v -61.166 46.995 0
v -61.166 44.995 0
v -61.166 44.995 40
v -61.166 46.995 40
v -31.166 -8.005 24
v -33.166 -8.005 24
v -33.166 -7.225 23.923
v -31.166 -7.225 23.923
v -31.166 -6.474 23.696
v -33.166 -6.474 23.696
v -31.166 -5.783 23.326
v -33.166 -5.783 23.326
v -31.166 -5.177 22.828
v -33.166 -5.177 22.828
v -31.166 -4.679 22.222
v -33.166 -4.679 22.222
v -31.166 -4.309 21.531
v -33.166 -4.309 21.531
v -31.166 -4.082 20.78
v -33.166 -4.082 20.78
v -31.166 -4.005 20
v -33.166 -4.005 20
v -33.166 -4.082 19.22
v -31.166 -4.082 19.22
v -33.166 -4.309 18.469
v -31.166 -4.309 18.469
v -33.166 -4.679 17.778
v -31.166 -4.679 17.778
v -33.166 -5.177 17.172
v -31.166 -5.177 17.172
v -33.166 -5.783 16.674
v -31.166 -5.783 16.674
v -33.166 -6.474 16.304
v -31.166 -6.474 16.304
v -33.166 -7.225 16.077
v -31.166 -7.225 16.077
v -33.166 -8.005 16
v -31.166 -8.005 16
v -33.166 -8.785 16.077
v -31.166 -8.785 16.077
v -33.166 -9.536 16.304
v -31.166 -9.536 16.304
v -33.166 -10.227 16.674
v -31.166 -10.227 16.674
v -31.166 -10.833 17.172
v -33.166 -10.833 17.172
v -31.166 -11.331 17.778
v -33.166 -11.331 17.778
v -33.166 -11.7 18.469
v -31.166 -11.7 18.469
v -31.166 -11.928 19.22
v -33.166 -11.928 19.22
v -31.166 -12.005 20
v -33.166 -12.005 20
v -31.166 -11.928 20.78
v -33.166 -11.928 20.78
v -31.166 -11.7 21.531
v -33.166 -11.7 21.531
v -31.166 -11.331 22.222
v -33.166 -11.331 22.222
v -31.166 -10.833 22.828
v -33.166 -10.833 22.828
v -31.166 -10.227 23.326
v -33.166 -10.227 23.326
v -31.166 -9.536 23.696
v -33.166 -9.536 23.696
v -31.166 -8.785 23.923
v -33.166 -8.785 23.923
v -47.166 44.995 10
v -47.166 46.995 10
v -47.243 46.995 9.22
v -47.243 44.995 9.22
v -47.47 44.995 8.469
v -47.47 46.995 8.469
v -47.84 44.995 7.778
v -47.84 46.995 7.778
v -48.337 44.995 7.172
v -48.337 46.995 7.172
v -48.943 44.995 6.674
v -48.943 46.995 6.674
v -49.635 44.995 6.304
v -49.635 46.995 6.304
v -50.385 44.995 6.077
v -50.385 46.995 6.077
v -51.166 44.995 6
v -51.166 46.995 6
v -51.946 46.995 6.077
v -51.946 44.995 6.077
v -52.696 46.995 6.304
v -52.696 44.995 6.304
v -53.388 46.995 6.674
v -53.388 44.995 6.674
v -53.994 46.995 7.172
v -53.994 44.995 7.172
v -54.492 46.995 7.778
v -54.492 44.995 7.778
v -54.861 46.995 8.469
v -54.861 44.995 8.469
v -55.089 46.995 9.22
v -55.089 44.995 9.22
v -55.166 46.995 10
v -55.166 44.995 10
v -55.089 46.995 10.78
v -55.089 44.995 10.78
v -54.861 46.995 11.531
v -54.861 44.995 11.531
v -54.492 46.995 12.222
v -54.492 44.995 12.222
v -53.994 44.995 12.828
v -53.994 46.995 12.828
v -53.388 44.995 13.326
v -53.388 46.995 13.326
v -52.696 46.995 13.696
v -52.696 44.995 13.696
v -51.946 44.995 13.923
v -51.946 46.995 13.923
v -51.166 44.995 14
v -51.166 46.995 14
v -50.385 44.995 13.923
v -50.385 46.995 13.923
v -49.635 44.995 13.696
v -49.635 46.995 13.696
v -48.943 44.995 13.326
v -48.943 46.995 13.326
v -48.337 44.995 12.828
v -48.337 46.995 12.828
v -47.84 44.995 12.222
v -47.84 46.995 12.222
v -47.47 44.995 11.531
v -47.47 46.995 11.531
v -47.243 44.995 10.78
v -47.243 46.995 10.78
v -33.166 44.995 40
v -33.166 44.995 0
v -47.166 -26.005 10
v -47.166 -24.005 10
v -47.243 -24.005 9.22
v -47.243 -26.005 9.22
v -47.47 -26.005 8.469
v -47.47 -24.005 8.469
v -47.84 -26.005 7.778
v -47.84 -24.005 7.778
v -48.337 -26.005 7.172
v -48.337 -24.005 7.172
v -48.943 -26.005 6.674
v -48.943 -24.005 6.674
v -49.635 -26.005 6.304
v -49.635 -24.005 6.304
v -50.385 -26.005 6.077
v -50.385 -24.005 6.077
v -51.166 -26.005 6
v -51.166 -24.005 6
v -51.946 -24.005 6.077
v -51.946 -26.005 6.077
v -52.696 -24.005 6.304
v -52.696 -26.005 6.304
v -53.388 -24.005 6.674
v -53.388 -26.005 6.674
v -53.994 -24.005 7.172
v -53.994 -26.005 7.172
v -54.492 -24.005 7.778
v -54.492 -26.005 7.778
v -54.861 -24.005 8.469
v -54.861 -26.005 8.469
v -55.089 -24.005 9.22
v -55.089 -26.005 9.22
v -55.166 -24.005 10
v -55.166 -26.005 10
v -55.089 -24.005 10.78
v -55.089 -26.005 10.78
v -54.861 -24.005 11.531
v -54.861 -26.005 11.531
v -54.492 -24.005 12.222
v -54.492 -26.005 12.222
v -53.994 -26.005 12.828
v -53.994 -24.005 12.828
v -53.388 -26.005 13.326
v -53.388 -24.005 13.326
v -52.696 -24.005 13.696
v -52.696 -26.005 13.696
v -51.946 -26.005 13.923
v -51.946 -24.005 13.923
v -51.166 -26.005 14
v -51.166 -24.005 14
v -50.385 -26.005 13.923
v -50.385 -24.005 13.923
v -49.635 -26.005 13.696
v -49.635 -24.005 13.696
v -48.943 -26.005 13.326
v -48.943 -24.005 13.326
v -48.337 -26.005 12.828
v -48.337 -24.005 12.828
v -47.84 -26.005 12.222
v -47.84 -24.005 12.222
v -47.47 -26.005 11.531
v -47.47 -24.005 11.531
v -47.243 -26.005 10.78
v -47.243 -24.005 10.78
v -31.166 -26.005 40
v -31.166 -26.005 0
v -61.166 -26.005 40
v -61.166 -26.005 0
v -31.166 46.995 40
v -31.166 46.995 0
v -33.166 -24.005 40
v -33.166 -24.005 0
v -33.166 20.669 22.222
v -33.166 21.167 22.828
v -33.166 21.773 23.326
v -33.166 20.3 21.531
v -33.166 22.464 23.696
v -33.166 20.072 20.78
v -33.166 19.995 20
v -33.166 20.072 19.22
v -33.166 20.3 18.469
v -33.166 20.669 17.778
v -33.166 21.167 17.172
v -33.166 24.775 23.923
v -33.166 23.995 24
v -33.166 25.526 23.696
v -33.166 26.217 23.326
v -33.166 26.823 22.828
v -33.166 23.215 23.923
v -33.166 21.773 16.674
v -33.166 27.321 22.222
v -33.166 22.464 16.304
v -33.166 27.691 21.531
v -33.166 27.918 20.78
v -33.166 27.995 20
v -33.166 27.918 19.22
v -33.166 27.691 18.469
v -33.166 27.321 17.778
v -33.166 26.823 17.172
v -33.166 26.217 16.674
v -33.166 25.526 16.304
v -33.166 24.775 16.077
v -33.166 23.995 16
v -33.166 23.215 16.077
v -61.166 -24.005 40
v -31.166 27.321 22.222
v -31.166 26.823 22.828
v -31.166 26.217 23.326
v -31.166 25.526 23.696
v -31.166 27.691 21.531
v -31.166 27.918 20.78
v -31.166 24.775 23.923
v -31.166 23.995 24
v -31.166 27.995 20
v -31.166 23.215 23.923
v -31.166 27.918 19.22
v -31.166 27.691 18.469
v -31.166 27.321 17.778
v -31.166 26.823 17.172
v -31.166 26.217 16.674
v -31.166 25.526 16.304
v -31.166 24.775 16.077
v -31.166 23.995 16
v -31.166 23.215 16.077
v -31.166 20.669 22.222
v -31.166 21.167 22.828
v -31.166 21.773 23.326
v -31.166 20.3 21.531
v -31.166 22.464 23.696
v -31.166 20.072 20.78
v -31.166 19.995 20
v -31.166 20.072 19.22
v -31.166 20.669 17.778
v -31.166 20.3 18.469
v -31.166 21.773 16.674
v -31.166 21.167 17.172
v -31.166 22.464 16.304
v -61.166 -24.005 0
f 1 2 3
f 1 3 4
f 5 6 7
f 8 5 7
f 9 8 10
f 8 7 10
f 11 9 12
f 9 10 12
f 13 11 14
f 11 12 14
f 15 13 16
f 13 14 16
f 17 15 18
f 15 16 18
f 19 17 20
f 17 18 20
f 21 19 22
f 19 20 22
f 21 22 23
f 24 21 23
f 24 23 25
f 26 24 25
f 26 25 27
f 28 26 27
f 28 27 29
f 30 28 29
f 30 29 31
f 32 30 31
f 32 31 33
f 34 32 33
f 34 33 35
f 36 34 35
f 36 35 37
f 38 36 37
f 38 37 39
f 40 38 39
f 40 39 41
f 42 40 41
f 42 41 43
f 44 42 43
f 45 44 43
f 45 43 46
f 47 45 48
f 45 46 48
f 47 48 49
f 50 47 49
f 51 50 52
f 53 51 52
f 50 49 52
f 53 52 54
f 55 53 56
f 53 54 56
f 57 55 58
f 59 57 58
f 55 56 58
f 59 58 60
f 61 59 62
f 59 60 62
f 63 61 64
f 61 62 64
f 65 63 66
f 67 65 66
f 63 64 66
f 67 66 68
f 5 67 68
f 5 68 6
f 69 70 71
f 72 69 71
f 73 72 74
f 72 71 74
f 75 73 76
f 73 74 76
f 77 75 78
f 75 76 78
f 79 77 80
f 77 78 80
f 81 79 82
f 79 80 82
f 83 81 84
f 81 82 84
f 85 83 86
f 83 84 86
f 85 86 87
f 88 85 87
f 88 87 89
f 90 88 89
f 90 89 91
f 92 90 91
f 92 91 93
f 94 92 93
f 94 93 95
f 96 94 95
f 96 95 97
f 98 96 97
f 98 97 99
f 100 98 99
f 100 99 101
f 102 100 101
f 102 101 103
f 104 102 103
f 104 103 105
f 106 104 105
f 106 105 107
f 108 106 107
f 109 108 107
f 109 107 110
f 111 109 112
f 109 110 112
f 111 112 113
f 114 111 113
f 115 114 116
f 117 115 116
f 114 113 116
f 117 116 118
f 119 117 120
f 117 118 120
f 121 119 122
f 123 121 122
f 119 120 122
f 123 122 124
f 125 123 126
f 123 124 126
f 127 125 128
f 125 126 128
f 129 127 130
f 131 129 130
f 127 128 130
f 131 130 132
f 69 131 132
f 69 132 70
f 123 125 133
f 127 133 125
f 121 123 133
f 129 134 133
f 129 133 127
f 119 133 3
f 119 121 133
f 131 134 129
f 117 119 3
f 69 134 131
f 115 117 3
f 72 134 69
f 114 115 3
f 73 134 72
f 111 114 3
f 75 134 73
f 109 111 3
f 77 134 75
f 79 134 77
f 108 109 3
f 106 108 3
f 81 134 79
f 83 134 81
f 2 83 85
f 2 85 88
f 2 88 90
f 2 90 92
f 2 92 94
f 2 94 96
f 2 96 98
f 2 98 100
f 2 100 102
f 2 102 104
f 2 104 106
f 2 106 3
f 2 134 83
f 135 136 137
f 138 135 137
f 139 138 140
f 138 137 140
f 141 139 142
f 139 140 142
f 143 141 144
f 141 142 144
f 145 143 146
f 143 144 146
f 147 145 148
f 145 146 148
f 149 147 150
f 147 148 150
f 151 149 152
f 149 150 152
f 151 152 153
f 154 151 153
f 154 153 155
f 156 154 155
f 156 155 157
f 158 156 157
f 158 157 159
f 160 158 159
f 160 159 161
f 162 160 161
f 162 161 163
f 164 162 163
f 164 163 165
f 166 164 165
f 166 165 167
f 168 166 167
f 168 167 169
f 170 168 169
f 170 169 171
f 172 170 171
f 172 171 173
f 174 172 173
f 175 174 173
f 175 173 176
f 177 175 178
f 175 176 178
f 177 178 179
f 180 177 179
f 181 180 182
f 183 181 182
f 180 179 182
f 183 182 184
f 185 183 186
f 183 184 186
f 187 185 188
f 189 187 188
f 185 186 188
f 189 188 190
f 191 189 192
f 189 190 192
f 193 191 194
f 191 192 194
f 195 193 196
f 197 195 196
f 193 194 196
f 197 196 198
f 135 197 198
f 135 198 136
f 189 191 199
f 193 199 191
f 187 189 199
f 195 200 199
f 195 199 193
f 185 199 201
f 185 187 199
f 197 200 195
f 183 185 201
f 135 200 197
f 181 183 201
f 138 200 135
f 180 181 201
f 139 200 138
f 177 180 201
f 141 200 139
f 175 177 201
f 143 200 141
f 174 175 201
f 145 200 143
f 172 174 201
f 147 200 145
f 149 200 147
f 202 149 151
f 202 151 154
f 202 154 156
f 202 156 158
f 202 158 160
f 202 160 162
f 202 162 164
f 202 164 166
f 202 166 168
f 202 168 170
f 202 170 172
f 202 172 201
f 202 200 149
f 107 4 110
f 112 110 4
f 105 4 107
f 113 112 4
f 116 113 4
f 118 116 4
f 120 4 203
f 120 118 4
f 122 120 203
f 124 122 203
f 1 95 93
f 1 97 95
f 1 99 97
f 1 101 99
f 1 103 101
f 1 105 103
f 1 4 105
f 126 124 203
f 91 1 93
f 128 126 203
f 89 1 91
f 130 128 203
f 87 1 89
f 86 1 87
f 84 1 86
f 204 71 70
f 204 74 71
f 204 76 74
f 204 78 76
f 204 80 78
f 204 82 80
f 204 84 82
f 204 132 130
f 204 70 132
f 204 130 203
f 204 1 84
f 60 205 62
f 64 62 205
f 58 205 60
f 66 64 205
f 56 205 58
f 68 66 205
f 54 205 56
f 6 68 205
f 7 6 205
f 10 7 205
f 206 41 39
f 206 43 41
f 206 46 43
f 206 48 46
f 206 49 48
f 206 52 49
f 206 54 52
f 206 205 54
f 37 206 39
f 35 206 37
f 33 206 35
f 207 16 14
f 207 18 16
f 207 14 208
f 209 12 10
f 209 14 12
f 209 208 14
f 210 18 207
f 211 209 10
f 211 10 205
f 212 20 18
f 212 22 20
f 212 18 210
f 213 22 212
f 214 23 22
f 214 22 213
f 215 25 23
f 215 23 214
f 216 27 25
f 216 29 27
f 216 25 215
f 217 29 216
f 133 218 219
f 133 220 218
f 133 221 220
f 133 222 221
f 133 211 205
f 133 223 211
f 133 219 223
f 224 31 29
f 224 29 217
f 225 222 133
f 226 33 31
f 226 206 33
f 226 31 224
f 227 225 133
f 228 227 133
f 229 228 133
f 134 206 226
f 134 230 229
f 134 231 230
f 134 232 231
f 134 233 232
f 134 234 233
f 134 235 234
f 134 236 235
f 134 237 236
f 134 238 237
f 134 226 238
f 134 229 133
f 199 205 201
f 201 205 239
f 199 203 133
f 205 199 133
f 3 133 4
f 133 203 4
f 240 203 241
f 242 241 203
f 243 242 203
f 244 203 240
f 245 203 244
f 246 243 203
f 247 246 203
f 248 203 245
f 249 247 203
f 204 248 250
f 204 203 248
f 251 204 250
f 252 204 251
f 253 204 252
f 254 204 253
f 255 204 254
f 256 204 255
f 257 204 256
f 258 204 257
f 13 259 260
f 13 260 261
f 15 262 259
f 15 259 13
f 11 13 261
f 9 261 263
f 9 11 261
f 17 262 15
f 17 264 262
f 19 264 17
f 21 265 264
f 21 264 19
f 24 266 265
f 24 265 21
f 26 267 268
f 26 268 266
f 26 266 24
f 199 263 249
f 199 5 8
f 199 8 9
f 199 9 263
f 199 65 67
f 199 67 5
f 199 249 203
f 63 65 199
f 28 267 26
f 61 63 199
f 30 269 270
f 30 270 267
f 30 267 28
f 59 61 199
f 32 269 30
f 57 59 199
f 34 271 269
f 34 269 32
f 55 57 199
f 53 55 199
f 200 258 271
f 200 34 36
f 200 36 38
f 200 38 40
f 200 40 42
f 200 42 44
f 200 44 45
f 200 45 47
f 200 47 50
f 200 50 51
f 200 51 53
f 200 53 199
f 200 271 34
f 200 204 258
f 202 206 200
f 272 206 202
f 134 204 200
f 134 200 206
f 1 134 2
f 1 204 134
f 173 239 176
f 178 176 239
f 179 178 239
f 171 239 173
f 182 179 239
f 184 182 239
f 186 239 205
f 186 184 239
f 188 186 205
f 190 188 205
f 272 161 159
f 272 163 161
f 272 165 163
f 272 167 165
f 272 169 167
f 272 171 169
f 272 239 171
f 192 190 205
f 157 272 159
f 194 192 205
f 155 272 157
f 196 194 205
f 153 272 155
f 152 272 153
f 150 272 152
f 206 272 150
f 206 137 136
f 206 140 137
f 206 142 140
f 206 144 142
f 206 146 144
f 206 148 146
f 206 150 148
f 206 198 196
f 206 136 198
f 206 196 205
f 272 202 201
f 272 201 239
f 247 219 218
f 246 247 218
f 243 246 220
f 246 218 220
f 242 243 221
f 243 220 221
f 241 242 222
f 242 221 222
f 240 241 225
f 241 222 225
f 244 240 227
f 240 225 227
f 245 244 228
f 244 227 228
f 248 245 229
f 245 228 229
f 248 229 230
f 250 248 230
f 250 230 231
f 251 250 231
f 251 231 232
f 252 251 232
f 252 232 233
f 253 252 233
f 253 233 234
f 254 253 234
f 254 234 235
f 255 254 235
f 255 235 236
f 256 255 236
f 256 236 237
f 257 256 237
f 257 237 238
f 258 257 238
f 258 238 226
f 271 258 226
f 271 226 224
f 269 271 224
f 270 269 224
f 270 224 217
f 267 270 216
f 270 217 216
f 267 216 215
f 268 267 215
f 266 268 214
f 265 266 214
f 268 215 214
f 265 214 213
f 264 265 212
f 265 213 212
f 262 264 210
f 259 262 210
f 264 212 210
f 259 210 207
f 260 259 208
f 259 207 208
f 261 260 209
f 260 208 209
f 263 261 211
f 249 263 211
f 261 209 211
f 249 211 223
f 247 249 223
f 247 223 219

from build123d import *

# Parameters (mm, degrees)
EXTRUDE_1_DEPTH     = 40
SKETCH_3_R          = 4
CUT_EXTRUDE_1_DEPTH = 40
SKETCH_4_R          = 4
CUT_EXTRUDE_2_DEPTH = 96


with BuildPart() as part:
    # 草图1 → 凸台-拉伸1 (new body)
    with BuildSketch(Plane.XY):
        Polygon((-61.165760894, 46.995024588), (-31.165760894, 46.995024588), (-31.165760894, -26.004975412), (-61.165760894, -26.004975412), (-61.165760894, -24.004975412), (-33.165760894, -24.004975412), (-33.165760894, 44.995024588), (-61.165760894, 44.995024588), align=None)
    extrude(amount=EXTRUDE_1_DEPTH)

    # 草图3 → 切除-拉伸1 (cut)
    with BuildSketch(Plane.ZY.offset(33.165760894)):
        with Locations((20, 23.995024588)):
            Circle(SKETCH_3_R)
        with Locations((20, -8.004975412)):
            Circle(SKETCH_3_R)
    extrude(amount=-CUT_EXTRUDE_1_DEPTH, mode=Mode.SUBTRACT)

    # 草图4 → 切除-拉伸2 (cut)
    with BuildSketch(Plane(origin=(0, 46.995024588, 0), x_dir=(1, 0, 0), z_dir=(0, 1, 0))):
        with Locations((-51.165760894, -10)):
            Circle(SKETCH_4_R)
    extrude(amount=-CUT_EXTRUDE_2_DEPTH, mode=Mode.SUBTRACT)


solid = part.part
